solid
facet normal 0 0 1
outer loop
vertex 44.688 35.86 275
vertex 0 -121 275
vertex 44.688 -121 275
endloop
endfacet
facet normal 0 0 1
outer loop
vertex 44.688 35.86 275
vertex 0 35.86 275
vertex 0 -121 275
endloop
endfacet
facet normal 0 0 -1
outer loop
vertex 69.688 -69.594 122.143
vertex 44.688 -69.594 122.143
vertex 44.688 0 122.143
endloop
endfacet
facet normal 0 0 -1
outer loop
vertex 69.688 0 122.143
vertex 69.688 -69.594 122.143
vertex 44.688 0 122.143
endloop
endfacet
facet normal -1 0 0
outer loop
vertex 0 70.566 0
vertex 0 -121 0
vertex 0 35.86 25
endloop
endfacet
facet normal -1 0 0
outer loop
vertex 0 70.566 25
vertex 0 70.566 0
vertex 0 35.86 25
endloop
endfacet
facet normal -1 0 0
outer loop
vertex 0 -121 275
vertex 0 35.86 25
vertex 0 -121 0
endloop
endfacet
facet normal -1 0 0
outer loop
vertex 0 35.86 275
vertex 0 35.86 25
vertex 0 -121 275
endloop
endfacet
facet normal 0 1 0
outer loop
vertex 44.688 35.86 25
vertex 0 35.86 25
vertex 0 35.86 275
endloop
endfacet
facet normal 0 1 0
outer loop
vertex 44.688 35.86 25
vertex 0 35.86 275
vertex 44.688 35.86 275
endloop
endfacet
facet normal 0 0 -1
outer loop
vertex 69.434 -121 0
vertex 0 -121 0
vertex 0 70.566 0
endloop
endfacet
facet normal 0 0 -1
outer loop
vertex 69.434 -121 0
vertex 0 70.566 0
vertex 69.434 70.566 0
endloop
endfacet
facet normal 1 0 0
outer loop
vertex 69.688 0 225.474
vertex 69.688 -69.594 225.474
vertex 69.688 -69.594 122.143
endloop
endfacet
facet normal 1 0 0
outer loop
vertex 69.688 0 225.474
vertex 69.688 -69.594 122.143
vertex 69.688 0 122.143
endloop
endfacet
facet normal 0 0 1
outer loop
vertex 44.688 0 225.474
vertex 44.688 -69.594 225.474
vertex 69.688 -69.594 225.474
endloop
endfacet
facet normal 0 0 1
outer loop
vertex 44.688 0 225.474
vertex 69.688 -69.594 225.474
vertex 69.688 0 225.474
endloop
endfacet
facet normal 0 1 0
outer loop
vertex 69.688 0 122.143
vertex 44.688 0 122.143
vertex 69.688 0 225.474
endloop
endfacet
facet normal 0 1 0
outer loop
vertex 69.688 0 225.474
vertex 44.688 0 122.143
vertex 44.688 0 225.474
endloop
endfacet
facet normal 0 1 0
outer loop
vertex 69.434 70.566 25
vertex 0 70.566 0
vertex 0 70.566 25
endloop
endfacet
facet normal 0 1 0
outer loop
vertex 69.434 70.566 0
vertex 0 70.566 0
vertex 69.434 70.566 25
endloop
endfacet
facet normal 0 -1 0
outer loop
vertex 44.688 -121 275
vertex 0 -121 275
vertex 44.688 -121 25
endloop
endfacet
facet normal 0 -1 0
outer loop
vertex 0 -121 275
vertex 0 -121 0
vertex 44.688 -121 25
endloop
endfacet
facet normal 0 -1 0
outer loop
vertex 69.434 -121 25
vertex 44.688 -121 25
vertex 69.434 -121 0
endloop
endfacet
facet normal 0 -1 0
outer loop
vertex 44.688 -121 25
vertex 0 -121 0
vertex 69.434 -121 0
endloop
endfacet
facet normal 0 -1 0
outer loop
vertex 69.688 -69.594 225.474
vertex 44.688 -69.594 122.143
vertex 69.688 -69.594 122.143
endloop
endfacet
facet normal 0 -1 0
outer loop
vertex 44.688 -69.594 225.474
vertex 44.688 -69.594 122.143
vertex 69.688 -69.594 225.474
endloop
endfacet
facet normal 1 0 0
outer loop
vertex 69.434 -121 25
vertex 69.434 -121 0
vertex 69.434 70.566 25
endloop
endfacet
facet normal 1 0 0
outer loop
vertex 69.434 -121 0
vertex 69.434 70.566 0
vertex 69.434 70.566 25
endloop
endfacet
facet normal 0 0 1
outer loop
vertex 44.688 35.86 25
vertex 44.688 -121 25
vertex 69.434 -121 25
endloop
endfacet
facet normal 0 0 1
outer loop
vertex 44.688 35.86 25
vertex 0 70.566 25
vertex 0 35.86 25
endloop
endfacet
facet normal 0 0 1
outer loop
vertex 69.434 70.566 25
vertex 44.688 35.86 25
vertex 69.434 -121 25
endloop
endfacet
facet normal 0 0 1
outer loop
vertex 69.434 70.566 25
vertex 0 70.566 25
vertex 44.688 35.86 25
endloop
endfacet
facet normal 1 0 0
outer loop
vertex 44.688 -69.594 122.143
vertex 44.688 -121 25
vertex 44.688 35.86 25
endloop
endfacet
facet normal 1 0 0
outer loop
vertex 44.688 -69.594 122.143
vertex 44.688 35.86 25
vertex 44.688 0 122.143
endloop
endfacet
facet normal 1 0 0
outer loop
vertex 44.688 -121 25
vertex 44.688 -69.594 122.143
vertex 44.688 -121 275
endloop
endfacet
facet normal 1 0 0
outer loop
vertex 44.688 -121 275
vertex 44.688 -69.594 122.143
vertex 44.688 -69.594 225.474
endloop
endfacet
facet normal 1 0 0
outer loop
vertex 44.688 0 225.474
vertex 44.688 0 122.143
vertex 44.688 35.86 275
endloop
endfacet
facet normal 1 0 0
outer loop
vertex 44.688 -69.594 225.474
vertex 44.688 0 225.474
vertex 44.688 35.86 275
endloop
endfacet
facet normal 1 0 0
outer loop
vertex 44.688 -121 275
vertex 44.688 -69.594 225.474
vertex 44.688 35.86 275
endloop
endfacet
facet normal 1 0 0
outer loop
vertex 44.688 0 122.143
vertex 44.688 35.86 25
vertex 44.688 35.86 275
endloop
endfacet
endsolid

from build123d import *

# Parameters (mm, degrees)
F0_W     = 69.4335103035
F0_H     = 70.5661773682
F1_DEPTH = 25
F2_W     = 44.6875952184
F2_H     = 35.8601175249
F3_DEPTH = 250
F4_DEPTH = 121
F5_W     = 69.5940330625
F5_H     = 103.3312529325
F7_DEPTH = 25


# Not quite as in the source:
# - the program builds the solid bodies; features that only make, move or delete a surface that nothing else refers to are left out


with BuildPart() as f1:
    # F0 (on Top) → F1 (new body)
    with BuildSketch(Plane.XY):
        with Locations((34.7167551517, 35.2830886841)):
            Rectangle(F0_W, F0_H)
    extrude(amount=F1_DEPTH)

    # F2 (on face) → F3 (join)
    with BuildSketch(Plane.XY.offset(25)):
        with Locations((22.3437976092, 17.9300587624)):
            Rectangle(F2_W, F2_H)
    extrude(amount=F3_DEPTH)

    # F4 (add): a face of the model
    f4_faces = [f1.faces().sort_by_distance(p)[0] for p in [
        (24.0077180628, 0, 131.5089430654),
    ]]
    extrude(f4_faces, amount=F4_DEPTH)

    # F5 (on face) → F7 (join)
    with BuildSketch(Plane.YZ.offset(44.6875952184)):
        with Locations((-34.7970165312, 173.8082841039)):
            Rectangle(F5_W, F5_H)
    extrude(amount=F7_DEPTH)


solid = f1.part
